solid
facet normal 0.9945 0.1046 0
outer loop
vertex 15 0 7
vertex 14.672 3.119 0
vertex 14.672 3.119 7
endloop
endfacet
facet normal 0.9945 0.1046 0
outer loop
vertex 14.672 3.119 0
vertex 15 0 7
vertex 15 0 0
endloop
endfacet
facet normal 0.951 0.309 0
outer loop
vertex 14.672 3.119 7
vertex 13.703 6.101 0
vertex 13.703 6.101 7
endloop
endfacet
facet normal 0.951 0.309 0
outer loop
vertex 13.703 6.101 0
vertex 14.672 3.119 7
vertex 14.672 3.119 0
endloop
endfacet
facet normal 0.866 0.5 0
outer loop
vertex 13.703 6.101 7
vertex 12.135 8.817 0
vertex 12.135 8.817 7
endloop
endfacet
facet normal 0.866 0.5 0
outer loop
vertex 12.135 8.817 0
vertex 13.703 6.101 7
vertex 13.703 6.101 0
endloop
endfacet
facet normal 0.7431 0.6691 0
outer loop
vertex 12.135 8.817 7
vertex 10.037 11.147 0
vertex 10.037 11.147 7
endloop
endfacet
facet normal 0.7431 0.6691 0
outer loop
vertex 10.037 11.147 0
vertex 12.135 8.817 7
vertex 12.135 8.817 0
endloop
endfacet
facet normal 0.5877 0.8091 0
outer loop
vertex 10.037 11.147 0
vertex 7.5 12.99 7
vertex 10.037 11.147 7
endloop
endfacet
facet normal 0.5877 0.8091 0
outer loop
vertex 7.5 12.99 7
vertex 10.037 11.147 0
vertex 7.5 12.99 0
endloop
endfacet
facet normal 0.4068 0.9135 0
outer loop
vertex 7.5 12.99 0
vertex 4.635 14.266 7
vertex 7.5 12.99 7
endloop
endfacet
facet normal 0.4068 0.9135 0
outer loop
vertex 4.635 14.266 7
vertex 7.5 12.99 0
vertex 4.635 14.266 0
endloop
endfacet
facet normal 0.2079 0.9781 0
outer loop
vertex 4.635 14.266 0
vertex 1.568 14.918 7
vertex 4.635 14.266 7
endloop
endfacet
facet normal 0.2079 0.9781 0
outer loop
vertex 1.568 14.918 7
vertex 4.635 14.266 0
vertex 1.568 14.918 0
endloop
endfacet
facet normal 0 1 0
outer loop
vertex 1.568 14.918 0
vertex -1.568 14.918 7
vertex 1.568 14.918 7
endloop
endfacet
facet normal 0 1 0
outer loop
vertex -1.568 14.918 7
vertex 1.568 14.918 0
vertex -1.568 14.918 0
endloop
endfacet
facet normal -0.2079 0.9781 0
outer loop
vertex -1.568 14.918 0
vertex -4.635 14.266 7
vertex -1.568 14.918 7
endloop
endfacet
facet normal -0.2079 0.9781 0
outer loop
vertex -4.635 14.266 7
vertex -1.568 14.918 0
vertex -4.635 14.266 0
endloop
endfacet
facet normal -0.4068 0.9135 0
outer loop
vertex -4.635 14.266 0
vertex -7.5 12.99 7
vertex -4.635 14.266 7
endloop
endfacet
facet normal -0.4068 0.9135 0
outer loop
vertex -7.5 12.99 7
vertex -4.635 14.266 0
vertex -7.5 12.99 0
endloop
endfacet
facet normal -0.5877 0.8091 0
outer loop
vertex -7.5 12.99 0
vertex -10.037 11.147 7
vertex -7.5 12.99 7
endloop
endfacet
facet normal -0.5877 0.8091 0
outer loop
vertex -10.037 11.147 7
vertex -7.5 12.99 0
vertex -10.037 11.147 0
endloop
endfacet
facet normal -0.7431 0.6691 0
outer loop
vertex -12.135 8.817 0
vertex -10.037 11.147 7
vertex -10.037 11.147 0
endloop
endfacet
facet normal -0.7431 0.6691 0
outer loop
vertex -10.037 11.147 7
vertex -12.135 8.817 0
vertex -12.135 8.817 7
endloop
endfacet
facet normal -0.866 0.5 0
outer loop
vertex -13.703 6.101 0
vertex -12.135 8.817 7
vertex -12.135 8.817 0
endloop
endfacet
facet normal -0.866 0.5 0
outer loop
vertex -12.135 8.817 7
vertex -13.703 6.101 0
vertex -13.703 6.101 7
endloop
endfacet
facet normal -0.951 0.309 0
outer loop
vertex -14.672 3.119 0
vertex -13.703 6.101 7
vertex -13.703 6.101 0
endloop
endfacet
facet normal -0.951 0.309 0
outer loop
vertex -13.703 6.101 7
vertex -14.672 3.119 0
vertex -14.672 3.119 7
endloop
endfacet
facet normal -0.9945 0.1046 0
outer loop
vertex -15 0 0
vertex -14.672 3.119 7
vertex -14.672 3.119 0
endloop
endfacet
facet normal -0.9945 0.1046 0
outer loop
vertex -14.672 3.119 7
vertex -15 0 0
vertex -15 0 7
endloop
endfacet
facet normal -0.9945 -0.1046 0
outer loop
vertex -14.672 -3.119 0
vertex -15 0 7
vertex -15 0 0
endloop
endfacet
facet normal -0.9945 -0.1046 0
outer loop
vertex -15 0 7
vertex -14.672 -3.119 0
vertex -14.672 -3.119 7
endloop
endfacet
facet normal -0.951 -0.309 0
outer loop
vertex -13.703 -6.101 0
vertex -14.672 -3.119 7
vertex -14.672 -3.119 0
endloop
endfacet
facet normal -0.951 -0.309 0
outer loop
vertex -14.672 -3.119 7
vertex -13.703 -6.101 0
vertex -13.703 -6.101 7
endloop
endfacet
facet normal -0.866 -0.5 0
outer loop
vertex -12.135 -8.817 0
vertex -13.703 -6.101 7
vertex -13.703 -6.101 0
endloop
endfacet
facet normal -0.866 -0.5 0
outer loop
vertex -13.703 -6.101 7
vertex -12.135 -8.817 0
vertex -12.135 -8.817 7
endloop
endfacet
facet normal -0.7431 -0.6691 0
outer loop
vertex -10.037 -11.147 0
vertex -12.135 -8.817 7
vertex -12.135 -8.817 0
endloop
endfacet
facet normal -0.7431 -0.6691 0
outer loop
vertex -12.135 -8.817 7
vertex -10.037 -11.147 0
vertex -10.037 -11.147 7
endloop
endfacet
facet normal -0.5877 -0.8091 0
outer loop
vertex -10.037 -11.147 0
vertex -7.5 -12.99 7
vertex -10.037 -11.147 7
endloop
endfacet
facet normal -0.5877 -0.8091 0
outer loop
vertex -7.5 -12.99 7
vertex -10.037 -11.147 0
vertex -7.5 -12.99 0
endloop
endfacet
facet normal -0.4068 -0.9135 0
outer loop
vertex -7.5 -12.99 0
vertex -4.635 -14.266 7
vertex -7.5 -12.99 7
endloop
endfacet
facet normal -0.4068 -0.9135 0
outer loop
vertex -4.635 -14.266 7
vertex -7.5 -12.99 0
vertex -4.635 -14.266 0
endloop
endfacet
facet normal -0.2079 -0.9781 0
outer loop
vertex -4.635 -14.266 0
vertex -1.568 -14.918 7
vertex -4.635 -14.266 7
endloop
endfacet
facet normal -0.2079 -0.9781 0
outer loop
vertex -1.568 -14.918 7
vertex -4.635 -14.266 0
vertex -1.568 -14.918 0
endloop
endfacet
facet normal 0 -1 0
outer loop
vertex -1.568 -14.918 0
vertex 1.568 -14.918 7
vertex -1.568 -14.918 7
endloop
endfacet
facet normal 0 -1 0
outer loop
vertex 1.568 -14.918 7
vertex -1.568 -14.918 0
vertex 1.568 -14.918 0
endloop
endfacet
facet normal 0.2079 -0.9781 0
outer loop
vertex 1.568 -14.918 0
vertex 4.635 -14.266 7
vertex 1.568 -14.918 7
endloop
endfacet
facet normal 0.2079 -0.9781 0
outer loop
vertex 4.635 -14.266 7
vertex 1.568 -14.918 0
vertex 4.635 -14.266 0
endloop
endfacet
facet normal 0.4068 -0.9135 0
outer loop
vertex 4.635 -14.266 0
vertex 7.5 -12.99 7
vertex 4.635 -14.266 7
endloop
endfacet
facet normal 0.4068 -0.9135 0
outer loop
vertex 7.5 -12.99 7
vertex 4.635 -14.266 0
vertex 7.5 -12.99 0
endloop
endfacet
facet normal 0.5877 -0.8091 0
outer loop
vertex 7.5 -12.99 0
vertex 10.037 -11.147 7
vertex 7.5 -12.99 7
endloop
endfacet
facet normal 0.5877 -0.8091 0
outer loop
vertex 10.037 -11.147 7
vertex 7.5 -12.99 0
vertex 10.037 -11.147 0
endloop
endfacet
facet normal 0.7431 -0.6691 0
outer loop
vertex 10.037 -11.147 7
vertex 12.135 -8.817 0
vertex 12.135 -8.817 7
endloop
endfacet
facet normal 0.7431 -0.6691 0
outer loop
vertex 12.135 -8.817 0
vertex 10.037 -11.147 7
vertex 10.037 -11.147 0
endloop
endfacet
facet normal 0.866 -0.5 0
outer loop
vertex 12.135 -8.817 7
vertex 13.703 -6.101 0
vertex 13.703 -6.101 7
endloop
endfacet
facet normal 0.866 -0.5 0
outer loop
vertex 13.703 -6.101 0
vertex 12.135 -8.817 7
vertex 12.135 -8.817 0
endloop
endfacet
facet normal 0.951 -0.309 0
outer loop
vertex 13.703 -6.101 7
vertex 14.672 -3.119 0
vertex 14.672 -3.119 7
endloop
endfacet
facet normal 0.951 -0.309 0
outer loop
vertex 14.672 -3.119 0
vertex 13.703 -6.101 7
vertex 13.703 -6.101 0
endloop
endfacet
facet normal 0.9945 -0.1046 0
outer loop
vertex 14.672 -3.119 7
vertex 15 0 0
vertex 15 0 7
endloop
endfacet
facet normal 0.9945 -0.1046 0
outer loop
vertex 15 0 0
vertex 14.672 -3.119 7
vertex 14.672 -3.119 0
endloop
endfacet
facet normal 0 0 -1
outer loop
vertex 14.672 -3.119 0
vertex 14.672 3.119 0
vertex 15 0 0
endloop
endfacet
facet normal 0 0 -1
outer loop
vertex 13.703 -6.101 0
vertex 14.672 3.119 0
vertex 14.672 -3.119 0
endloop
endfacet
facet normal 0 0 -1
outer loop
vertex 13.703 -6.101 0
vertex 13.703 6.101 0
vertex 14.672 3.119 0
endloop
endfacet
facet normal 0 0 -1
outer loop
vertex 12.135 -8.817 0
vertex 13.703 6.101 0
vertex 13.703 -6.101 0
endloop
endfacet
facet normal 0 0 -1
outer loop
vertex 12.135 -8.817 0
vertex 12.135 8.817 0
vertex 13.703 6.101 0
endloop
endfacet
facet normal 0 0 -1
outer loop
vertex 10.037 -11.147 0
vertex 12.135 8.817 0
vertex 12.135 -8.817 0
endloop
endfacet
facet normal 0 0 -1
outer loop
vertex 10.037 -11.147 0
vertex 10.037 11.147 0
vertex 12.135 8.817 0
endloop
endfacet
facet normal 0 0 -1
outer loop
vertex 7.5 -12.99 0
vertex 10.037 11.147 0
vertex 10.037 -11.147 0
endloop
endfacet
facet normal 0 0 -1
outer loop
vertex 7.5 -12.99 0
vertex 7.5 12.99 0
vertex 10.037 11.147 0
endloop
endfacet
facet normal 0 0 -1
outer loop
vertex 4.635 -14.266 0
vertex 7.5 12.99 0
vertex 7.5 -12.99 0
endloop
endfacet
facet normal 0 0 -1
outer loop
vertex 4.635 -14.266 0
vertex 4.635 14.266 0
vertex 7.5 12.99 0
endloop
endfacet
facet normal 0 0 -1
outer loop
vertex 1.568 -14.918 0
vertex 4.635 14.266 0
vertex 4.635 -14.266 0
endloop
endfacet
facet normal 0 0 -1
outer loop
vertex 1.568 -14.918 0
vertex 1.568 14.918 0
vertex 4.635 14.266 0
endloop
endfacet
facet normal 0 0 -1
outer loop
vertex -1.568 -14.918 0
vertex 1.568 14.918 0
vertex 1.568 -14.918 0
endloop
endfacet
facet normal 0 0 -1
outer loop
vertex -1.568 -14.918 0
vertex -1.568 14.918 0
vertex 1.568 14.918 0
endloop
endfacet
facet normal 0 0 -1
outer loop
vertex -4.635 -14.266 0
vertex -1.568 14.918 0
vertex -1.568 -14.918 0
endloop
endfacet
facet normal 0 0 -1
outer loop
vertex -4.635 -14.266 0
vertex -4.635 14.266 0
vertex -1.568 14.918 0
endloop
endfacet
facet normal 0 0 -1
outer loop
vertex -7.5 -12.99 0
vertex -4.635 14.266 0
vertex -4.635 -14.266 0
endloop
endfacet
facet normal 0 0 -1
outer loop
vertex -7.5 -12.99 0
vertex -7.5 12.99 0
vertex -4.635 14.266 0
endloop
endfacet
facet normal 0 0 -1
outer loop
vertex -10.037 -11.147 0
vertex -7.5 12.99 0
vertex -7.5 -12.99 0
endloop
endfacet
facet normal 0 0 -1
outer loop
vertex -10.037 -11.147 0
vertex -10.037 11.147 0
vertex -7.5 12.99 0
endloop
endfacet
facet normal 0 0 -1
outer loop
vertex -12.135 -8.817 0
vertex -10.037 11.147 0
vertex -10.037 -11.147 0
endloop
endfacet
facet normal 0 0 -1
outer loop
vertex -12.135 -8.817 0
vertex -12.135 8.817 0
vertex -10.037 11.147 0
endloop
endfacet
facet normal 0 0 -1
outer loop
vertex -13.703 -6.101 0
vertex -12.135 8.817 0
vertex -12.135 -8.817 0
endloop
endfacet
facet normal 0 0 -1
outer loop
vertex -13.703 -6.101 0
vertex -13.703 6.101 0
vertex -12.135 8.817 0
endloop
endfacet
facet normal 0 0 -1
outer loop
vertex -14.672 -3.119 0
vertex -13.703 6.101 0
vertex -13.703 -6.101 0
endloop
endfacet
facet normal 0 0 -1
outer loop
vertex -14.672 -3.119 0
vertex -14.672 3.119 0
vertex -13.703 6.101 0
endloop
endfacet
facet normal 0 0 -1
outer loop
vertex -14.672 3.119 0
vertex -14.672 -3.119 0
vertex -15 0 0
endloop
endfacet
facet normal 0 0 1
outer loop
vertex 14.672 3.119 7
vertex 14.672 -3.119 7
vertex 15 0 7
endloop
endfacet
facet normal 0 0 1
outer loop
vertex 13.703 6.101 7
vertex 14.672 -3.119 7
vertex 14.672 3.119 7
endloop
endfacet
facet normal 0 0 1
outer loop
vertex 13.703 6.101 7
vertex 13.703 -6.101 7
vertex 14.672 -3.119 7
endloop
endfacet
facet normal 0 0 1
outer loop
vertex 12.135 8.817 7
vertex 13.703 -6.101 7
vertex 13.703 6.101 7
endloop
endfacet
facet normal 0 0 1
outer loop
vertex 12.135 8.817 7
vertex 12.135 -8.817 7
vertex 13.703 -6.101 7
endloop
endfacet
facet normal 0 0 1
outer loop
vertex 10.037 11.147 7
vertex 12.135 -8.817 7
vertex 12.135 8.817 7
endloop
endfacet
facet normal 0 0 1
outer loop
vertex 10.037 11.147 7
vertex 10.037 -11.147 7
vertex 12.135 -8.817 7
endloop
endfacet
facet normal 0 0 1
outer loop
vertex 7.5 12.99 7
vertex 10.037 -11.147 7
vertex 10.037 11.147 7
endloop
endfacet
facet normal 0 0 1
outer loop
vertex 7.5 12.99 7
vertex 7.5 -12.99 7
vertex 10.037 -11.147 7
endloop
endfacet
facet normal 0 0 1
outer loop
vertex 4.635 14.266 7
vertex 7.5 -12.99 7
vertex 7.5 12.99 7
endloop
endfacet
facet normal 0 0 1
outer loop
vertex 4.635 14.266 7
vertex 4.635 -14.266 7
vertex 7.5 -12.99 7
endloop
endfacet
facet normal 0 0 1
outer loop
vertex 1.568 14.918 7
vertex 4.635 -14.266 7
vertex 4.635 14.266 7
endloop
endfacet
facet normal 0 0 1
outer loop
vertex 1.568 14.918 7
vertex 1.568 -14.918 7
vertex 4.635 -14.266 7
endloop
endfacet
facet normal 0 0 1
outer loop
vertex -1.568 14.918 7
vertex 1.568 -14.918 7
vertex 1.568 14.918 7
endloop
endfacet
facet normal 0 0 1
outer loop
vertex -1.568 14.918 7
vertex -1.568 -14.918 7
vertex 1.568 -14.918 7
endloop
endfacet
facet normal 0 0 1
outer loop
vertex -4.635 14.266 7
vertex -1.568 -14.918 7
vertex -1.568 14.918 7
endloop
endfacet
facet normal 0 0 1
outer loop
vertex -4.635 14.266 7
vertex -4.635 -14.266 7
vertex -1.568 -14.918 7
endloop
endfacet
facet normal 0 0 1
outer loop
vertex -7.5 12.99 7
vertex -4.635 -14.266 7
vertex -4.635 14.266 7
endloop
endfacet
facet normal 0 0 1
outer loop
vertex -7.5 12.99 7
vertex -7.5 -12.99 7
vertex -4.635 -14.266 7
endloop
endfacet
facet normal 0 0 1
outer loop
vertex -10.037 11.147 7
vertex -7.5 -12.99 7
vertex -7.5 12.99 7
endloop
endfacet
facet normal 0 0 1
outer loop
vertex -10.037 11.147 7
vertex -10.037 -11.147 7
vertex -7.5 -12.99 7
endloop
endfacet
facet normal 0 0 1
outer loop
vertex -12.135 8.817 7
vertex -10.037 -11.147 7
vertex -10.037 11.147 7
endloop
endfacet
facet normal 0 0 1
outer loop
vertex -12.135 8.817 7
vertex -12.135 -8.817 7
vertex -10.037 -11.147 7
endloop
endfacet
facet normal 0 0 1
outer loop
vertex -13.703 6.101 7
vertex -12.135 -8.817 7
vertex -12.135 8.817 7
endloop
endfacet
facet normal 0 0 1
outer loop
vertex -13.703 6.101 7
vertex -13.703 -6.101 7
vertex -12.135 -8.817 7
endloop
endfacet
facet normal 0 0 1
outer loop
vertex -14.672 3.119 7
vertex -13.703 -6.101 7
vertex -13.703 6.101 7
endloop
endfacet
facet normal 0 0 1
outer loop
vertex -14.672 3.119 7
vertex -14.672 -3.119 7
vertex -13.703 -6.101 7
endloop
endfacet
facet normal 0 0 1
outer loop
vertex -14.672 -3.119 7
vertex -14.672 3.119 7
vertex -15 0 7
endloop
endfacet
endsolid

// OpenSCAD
// Generated by SolidPython 1.0.1 on 2020-07-29 00:39:25


cylinder(h = 7, r1 = 15, r2 = 15);
/***********************************************
*********      SolidPython code:      **********
************************************************
 
# import packages: SolidPython
from solid import *
from solid.utils import *
from itertools import chain, combinations


class Resize:

    def __init__(self, scad_file):
        self.scad_file = scad_file
        #self.scad_file = import_scad(scad_file)
        # cone/cylinder param:
        self.r1 = 0
        self.r2 = 0
        self.h = 0
        # rectangular prism param:
        self.w = 0
        self.l = 0
        # ellipse param:
        self.r = 0

    # import OpenScad code (file name corresponds to shape)


    # classify shape + parameters
    def assign(self, param1, param2, param3):
        if self.scad_file == 'cone.scad':
            self.r1 = param1
            self.r2 = param2
            self.h = param3
        elif self.scad_file == 'cylinder.scad':
            self.r1 = param1
            self.r2 = param2
            self.h = param3
        elif self.scad_file == 'rectangularPrism.scad':
            self.h = param1
            self.l = param2
            self.w = param3
        else:
            self.r = param1
            self.h = param2

    # resize parameters
    def iterate(self):
        x = range(3, 20, 2)
        i = 1
        if self.scad_file == 'cone.scad':
            tempList = list(combinations(x, 2))
            for temp in tempList:
                param1 = temp[0]
                param2 = temp[1]
                filepath = 'produced_scad_files/' + 'cone' + str(param1) + '_' + str(param2) + '_' + '.scad'
                scad_render_to_file(cylinder(h=param1, r1=param2, r2=0), filepath)

        elif self.scad_file == 'cylinder.scad':
            tempList = list(combinations(x, 3))
            for temp in tempList:
                param1 = temp[0]
                param2 = temp[1]
                filepath = 'produced_scad_files/' + 'cylinder' + str(param1) + '_' + str(param2) + '_' + '.scad'
                scad_render_to_file(cylinder(h=param1, r1=param2, r2=param2), filepath)

        elif self.scad_file == 'rectangularPrism.scad':
            tempList = list(combinations(x, 3))
            for temp in tempList:
                param1 = temp[0]
                param2 = temp[1]
                param3 = temp[2]
                filepath = 'produced_scad_files/' + 'rectangularPrism' + str(param1) + '_' + str(param2) + '_' + str(
                    param3) + '.scad'
                scad_render_to_file(cube(size=(param1, param2, param3)), filepath)

        elif self.scad_file == 'ellipse.scad':
            tempList = list(combinations(x, 4))
            for temp in tempList:
                param1 = temp[0]
                param2 = temp[1]
                param3 = temp[2]
                param4 = temp[3]
                filepath = 'produced_scad_files/' + 'ellipse' + str(param1) + '_' + str(param2) + '_' + str(param3) + '_' + str(param4) + '.scad'
                scad_render_to_file(scale([param1, param2, param3])(sphere(r=param4)), filepath)

    def render_to_scadfile(self):
        scad_render_to_file(scad, 'example.scad') 
 
************************************************/
